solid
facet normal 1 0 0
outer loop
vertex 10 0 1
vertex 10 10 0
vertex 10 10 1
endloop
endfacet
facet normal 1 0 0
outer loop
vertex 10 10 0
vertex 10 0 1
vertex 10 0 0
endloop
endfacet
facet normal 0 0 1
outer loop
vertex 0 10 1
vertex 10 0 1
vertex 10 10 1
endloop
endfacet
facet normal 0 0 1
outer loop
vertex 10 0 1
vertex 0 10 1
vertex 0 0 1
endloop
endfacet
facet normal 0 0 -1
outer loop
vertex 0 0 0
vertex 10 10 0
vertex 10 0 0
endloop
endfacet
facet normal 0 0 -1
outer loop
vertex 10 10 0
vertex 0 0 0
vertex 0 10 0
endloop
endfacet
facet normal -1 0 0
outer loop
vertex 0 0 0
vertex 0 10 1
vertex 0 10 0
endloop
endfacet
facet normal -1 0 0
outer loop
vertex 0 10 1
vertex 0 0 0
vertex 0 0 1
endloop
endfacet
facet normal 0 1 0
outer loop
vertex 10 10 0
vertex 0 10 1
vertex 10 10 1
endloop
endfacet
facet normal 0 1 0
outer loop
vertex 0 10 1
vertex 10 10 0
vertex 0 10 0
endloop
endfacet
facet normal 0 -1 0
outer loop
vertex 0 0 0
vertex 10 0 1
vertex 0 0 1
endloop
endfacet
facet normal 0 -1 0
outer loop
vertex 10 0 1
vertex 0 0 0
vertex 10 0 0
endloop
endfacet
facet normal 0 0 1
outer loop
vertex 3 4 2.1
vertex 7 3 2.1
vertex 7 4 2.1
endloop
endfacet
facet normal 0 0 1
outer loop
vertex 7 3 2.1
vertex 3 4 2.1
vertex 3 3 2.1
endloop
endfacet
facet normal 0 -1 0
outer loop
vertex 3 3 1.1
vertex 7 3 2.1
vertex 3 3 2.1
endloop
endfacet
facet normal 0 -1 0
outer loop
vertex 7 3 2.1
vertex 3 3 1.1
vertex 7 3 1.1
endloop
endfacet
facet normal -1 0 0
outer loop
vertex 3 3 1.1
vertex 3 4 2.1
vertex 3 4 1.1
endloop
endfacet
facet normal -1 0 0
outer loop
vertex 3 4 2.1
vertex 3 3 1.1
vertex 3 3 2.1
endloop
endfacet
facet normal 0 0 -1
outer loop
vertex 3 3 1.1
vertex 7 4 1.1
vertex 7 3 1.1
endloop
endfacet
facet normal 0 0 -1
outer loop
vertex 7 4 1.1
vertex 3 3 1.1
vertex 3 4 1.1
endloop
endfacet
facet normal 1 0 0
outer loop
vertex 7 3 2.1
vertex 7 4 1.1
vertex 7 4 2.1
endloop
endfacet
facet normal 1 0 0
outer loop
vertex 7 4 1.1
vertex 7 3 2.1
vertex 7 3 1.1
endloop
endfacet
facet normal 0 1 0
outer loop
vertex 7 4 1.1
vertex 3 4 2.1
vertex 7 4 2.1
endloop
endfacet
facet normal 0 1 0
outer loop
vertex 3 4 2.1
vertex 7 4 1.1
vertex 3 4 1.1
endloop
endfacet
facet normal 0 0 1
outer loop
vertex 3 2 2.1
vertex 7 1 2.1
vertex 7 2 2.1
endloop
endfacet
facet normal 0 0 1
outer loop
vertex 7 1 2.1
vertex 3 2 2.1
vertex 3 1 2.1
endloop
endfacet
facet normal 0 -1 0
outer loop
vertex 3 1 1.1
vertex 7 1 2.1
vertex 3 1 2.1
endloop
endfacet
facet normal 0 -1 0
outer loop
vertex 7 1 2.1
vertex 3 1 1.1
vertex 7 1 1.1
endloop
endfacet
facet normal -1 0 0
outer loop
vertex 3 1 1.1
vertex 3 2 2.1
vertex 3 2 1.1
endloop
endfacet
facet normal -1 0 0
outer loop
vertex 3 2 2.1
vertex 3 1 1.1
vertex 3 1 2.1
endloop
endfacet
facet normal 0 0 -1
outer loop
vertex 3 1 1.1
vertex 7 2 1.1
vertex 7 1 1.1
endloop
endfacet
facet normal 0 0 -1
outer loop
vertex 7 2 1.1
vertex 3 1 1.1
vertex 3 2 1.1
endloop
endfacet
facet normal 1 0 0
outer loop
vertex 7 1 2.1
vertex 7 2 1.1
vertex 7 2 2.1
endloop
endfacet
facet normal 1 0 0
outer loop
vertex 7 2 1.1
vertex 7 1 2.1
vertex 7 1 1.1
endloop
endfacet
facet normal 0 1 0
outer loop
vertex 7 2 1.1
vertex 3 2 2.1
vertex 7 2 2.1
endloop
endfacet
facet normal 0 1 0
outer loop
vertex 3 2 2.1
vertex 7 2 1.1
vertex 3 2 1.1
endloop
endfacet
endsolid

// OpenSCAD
// file: triangle.scad
module triangle(base=10, length=10, rise=2.5, z=1){
    
    points=[
        //bottom and top triangle portion
        [0,0,0],[0,0,z],[0,base,0],[0,base,z],
        [length,rise,0],[length,rise,z],
    ];
    
    faces=[
        [0,2,4], //bot
        [5,3,1], //top
        [0,2,3,1], //tangent brick
        [0,1,5,4], //side square
        [4,5,3,2], //side square
    ];
           
        
     polyhedron(points, faces);
        
        
 
    
    }
//triangle();
// main file
use <triangle.scad>;

cube([10,10,1]);

    //color("blue")
    //translate([5,0,2]) cylinder(h=1, r=1.5);
color("blue")
translate([7, 3, 1.1]) rotate([0,0,90]) cube([1, 4, 1]);
color("blue")
translate([7, 1, 1.1]) rotate([0,0,90]) cube([1, 4, 1]);
color("blue")
translate([7,5,1.1]) rotate([0,0,90]) triangle(base=4,length=4, rise=2,z=1);
